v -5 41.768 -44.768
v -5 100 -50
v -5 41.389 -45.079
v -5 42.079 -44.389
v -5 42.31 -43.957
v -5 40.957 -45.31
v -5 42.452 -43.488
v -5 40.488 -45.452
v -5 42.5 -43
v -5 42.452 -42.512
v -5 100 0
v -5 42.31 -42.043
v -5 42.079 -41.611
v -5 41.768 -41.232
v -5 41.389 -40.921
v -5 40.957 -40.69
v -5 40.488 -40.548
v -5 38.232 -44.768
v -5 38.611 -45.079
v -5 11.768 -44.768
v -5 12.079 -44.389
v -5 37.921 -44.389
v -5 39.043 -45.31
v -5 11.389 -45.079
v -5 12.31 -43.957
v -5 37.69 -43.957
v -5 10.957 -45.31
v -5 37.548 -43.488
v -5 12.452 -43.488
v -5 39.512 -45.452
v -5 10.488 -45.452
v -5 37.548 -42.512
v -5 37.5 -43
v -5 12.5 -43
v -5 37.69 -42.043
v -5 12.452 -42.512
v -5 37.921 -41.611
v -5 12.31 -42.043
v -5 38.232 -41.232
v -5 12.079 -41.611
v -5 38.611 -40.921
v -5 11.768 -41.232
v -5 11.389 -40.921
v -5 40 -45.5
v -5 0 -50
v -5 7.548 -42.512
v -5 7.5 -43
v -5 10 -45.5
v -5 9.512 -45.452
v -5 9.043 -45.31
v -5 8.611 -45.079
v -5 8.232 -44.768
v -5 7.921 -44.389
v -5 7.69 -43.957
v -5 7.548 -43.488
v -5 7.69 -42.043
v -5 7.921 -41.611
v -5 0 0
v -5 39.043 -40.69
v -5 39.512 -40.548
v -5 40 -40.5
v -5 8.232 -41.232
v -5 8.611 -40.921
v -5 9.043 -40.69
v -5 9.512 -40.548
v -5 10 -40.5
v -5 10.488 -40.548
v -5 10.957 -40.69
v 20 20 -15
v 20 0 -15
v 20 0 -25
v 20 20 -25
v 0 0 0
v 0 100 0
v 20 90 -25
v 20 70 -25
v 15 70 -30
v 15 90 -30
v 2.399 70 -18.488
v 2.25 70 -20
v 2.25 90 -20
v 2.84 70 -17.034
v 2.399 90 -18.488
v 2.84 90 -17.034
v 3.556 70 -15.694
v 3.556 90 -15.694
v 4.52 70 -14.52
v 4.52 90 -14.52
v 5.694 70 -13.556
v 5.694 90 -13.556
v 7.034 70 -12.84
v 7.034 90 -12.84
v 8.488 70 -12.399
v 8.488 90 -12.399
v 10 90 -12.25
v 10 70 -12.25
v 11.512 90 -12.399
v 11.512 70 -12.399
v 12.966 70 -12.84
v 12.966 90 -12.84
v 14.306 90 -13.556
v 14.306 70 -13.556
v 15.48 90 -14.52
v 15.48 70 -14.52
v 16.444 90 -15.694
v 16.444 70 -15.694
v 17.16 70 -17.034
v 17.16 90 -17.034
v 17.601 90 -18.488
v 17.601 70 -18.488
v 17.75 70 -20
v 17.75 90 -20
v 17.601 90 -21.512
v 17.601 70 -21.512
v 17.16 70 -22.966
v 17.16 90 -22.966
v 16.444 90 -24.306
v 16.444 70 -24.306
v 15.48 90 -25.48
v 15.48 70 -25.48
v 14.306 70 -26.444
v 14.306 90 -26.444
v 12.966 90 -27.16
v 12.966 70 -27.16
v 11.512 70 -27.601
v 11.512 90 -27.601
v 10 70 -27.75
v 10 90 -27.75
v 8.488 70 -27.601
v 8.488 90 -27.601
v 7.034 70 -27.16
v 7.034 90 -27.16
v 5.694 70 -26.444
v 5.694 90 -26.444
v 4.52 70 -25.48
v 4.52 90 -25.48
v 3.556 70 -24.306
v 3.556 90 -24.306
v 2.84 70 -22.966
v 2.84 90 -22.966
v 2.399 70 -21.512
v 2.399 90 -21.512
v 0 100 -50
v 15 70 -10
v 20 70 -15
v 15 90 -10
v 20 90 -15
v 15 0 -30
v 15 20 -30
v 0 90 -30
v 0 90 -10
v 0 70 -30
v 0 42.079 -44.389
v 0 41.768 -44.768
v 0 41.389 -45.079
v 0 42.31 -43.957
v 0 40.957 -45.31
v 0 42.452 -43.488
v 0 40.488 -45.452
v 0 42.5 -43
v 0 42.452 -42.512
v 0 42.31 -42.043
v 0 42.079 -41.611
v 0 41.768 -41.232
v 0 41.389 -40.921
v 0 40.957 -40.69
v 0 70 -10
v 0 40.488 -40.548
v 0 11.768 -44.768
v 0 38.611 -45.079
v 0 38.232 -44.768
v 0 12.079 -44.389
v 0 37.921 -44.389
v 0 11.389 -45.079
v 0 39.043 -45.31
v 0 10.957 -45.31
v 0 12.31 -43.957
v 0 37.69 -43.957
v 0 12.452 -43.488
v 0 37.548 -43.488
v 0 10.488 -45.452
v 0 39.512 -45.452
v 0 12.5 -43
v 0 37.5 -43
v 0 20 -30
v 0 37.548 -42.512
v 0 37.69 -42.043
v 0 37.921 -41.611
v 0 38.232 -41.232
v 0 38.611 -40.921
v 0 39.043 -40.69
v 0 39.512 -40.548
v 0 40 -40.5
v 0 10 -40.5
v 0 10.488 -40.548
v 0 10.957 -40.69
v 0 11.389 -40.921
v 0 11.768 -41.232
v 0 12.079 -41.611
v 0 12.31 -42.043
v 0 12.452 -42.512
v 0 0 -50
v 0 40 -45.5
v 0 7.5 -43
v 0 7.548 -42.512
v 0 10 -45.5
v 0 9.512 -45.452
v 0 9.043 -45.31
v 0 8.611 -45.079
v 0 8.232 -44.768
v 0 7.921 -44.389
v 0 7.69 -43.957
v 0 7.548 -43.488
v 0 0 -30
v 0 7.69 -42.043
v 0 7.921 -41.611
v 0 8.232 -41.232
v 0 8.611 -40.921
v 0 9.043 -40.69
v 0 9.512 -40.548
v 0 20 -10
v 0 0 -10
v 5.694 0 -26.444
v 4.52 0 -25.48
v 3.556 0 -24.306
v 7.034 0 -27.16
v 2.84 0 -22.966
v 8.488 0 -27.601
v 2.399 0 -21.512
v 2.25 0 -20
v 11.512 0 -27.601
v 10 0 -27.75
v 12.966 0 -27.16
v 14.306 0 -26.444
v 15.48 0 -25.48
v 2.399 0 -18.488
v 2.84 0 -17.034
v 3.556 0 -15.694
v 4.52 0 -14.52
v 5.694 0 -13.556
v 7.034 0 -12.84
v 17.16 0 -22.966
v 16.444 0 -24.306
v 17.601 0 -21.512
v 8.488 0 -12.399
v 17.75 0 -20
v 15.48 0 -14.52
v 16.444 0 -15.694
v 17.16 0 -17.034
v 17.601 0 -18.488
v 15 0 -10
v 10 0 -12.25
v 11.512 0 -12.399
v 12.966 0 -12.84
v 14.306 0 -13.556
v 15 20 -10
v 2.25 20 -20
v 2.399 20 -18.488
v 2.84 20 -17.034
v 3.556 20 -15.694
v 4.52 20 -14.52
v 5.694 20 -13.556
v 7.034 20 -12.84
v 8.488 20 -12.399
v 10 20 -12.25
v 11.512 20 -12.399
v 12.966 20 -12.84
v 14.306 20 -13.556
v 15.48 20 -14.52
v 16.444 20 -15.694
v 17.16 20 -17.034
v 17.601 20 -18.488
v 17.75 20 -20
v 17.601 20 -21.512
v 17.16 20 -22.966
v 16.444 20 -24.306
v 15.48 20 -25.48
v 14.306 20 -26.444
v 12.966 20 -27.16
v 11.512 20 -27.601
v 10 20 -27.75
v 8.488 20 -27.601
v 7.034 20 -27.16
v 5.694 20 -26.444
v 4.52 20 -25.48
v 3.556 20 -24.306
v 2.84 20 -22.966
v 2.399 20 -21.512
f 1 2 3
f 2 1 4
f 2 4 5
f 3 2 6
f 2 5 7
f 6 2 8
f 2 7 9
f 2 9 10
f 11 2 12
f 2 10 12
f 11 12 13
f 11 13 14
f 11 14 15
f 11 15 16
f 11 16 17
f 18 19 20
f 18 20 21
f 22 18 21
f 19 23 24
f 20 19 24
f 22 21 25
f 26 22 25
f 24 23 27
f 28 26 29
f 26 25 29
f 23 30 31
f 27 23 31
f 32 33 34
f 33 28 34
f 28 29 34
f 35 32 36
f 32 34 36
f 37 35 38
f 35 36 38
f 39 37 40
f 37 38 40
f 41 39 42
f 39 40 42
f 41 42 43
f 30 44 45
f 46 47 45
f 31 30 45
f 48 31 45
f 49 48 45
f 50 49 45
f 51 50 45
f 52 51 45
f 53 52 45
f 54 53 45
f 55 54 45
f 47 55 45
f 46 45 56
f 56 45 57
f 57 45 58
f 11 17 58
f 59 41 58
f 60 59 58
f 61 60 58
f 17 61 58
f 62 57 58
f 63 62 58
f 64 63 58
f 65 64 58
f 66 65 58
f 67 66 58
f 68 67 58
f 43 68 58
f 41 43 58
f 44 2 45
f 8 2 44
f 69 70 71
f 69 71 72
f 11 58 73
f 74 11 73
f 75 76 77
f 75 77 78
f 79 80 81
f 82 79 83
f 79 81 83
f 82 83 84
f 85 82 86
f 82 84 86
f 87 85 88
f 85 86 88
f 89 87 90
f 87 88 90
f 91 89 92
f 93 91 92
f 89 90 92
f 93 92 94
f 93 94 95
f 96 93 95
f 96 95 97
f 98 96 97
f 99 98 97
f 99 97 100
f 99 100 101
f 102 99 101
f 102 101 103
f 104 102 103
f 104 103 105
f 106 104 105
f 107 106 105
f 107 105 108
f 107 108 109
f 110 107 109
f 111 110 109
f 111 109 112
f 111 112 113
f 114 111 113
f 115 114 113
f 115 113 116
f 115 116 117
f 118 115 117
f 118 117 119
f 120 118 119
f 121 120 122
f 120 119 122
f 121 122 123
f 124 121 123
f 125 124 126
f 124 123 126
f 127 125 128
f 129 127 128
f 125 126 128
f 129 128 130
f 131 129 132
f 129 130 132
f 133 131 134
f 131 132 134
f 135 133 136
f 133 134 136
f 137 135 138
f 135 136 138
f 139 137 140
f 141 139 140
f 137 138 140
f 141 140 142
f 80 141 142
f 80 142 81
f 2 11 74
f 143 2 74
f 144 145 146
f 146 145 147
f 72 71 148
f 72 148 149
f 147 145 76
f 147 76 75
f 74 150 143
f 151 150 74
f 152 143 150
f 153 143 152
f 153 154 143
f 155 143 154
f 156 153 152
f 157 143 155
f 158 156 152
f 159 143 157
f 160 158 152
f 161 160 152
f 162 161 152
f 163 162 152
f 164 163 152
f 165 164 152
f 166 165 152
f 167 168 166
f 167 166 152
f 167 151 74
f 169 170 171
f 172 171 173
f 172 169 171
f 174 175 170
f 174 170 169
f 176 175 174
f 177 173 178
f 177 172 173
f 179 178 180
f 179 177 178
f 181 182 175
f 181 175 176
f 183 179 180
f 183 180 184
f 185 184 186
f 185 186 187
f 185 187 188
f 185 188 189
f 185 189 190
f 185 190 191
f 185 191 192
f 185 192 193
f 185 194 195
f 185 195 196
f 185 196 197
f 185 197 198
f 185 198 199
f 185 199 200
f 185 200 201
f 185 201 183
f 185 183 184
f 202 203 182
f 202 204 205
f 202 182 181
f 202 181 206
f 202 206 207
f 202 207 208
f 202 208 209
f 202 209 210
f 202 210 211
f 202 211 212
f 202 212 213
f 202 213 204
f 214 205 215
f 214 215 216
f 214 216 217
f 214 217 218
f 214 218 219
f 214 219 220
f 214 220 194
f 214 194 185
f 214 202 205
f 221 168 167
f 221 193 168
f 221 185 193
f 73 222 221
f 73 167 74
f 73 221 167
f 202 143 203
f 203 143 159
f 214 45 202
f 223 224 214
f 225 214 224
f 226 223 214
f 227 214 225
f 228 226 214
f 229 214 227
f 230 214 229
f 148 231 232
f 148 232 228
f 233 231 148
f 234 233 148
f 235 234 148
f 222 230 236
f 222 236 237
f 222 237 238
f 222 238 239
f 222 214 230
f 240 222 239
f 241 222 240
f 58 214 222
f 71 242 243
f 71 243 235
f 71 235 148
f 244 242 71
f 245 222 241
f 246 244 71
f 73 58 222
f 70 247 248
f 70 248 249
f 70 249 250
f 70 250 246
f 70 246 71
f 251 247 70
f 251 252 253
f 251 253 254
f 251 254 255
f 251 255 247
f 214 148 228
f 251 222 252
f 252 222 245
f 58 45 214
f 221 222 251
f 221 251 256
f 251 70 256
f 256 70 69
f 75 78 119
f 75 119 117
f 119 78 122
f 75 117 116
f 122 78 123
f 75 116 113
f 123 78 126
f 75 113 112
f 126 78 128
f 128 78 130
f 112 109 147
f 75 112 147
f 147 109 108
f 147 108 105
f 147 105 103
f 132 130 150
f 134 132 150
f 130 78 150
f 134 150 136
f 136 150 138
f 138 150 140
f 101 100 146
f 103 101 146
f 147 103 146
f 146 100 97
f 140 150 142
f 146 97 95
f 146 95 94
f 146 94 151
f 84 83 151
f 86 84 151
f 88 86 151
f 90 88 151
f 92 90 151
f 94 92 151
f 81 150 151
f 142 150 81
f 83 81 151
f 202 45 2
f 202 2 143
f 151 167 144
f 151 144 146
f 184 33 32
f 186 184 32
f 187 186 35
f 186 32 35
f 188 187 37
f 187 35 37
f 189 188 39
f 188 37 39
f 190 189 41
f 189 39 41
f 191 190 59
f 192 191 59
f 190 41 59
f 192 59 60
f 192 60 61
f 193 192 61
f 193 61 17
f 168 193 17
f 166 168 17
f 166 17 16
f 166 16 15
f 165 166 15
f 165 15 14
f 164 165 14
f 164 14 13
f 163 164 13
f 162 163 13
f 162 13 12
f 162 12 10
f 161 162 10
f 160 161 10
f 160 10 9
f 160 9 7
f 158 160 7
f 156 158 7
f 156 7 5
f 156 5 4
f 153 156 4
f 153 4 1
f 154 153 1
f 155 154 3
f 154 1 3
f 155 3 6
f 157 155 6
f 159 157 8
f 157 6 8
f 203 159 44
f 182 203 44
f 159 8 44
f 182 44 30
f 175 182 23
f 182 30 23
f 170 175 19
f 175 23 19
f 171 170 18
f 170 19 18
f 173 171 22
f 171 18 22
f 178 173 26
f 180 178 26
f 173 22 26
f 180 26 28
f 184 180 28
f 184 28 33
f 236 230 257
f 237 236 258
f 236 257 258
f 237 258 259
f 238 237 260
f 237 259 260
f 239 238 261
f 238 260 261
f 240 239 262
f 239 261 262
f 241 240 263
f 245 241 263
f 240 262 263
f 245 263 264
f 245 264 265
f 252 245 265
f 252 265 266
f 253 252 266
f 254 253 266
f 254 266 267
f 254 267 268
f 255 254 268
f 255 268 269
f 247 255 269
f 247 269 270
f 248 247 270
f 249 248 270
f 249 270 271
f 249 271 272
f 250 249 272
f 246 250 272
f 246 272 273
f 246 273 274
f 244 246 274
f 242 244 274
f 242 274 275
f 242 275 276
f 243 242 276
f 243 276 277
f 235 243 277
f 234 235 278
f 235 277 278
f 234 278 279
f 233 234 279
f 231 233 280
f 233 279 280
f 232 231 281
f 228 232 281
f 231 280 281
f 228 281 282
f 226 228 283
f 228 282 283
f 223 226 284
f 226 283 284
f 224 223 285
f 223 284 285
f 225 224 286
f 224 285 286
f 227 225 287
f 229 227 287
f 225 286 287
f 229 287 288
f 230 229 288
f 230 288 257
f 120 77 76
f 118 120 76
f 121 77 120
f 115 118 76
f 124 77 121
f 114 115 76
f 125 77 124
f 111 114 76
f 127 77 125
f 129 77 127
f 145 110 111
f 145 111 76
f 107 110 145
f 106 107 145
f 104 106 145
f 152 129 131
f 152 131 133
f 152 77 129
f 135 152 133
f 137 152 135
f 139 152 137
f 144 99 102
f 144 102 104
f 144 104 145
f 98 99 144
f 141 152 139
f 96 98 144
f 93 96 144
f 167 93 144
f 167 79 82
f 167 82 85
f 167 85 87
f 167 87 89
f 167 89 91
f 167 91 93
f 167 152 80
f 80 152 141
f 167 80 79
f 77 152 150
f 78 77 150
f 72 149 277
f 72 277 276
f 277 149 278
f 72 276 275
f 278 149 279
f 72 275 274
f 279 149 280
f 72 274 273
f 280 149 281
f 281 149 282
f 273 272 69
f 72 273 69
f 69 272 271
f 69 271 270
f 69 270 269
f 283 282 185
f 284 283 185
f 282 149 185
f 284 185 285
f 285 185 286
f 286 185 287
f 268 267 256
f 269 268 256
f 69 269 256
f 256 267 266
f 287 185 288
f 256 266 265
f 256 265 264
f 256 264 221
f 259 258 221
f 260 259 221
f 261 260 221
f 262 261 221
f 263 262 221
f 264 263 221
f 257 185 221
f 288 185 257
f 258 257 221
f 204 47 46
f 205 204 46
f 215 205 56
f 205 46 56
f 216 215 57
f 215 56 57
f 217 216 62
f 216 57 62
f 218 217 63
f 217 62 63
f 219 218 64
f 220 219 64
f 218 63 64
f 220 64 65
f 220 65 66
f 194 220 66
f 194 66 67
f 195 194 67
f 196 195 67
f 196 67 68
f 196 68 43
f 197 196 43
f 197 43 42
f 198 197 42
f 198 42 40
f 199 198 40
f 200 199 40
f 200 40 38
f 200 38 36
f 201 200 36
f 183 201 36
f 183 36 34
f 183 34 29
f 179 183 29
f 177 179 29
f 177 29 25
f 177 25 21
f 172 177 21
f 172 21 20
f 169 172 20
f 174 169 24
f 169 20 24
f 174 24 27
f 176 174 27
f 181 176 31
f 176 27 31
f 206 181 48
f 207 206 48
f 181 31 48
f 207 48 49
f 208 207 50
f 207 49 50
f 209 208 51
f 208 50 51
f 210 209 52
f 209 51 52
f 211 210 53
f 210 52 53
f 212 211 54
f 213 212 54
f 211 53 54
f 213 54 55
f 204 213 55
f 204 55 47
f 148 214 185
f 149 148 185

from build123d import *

# Parameters (mm, degrees)
F0_W     = 5
F0_H     = 50
F1_DEPTH = 100
F3_D     = 5
F2_W     = 20
F2_H     = 20
F4_DEPTH = 20
F5_SIZE  = 5
F7_D     = 15.5


with BuildPart() as f1:
    # F0 (on Front) → F1 (new body)
    with BuildSketch(Plane.XZ):
        with Locations((-2.5, -25)):
            Rectangle(F0_W, F0_H)
    extrude(amount=-F1_DEPTH)

    # F3 (through all)
    with Locations(Plane.YZ):
        with Locations((10, -43), (40, -43)):
            Hole(F3_D / 2)

    # F2 (on face) → F4 (join)
    with BuildSketch(Plane.YZ):
        with Locations((10, -20)):
            Rectangle(F2_W, F2_H)
        with Locations((80, -20)):
            Rectangle(F2_W, F2_H)
    extrude(amount=F4_DEPTH)

    # F5
    f5_edges = [f1.edges().sort_by_distance(p)[0] for p in [
        (20, 10, -10),
        (20, 10, -30),
        (20, 80, -10),
        (20, 80, -30),
    ]]
    chamfer(f5_edges, length=F5_SIZE)

    # F7 (through all)
    with Locations(Plane.XZ):
        with Locations((10, -20)):
            Hole(F7_D / 2)


solid = f1.part
